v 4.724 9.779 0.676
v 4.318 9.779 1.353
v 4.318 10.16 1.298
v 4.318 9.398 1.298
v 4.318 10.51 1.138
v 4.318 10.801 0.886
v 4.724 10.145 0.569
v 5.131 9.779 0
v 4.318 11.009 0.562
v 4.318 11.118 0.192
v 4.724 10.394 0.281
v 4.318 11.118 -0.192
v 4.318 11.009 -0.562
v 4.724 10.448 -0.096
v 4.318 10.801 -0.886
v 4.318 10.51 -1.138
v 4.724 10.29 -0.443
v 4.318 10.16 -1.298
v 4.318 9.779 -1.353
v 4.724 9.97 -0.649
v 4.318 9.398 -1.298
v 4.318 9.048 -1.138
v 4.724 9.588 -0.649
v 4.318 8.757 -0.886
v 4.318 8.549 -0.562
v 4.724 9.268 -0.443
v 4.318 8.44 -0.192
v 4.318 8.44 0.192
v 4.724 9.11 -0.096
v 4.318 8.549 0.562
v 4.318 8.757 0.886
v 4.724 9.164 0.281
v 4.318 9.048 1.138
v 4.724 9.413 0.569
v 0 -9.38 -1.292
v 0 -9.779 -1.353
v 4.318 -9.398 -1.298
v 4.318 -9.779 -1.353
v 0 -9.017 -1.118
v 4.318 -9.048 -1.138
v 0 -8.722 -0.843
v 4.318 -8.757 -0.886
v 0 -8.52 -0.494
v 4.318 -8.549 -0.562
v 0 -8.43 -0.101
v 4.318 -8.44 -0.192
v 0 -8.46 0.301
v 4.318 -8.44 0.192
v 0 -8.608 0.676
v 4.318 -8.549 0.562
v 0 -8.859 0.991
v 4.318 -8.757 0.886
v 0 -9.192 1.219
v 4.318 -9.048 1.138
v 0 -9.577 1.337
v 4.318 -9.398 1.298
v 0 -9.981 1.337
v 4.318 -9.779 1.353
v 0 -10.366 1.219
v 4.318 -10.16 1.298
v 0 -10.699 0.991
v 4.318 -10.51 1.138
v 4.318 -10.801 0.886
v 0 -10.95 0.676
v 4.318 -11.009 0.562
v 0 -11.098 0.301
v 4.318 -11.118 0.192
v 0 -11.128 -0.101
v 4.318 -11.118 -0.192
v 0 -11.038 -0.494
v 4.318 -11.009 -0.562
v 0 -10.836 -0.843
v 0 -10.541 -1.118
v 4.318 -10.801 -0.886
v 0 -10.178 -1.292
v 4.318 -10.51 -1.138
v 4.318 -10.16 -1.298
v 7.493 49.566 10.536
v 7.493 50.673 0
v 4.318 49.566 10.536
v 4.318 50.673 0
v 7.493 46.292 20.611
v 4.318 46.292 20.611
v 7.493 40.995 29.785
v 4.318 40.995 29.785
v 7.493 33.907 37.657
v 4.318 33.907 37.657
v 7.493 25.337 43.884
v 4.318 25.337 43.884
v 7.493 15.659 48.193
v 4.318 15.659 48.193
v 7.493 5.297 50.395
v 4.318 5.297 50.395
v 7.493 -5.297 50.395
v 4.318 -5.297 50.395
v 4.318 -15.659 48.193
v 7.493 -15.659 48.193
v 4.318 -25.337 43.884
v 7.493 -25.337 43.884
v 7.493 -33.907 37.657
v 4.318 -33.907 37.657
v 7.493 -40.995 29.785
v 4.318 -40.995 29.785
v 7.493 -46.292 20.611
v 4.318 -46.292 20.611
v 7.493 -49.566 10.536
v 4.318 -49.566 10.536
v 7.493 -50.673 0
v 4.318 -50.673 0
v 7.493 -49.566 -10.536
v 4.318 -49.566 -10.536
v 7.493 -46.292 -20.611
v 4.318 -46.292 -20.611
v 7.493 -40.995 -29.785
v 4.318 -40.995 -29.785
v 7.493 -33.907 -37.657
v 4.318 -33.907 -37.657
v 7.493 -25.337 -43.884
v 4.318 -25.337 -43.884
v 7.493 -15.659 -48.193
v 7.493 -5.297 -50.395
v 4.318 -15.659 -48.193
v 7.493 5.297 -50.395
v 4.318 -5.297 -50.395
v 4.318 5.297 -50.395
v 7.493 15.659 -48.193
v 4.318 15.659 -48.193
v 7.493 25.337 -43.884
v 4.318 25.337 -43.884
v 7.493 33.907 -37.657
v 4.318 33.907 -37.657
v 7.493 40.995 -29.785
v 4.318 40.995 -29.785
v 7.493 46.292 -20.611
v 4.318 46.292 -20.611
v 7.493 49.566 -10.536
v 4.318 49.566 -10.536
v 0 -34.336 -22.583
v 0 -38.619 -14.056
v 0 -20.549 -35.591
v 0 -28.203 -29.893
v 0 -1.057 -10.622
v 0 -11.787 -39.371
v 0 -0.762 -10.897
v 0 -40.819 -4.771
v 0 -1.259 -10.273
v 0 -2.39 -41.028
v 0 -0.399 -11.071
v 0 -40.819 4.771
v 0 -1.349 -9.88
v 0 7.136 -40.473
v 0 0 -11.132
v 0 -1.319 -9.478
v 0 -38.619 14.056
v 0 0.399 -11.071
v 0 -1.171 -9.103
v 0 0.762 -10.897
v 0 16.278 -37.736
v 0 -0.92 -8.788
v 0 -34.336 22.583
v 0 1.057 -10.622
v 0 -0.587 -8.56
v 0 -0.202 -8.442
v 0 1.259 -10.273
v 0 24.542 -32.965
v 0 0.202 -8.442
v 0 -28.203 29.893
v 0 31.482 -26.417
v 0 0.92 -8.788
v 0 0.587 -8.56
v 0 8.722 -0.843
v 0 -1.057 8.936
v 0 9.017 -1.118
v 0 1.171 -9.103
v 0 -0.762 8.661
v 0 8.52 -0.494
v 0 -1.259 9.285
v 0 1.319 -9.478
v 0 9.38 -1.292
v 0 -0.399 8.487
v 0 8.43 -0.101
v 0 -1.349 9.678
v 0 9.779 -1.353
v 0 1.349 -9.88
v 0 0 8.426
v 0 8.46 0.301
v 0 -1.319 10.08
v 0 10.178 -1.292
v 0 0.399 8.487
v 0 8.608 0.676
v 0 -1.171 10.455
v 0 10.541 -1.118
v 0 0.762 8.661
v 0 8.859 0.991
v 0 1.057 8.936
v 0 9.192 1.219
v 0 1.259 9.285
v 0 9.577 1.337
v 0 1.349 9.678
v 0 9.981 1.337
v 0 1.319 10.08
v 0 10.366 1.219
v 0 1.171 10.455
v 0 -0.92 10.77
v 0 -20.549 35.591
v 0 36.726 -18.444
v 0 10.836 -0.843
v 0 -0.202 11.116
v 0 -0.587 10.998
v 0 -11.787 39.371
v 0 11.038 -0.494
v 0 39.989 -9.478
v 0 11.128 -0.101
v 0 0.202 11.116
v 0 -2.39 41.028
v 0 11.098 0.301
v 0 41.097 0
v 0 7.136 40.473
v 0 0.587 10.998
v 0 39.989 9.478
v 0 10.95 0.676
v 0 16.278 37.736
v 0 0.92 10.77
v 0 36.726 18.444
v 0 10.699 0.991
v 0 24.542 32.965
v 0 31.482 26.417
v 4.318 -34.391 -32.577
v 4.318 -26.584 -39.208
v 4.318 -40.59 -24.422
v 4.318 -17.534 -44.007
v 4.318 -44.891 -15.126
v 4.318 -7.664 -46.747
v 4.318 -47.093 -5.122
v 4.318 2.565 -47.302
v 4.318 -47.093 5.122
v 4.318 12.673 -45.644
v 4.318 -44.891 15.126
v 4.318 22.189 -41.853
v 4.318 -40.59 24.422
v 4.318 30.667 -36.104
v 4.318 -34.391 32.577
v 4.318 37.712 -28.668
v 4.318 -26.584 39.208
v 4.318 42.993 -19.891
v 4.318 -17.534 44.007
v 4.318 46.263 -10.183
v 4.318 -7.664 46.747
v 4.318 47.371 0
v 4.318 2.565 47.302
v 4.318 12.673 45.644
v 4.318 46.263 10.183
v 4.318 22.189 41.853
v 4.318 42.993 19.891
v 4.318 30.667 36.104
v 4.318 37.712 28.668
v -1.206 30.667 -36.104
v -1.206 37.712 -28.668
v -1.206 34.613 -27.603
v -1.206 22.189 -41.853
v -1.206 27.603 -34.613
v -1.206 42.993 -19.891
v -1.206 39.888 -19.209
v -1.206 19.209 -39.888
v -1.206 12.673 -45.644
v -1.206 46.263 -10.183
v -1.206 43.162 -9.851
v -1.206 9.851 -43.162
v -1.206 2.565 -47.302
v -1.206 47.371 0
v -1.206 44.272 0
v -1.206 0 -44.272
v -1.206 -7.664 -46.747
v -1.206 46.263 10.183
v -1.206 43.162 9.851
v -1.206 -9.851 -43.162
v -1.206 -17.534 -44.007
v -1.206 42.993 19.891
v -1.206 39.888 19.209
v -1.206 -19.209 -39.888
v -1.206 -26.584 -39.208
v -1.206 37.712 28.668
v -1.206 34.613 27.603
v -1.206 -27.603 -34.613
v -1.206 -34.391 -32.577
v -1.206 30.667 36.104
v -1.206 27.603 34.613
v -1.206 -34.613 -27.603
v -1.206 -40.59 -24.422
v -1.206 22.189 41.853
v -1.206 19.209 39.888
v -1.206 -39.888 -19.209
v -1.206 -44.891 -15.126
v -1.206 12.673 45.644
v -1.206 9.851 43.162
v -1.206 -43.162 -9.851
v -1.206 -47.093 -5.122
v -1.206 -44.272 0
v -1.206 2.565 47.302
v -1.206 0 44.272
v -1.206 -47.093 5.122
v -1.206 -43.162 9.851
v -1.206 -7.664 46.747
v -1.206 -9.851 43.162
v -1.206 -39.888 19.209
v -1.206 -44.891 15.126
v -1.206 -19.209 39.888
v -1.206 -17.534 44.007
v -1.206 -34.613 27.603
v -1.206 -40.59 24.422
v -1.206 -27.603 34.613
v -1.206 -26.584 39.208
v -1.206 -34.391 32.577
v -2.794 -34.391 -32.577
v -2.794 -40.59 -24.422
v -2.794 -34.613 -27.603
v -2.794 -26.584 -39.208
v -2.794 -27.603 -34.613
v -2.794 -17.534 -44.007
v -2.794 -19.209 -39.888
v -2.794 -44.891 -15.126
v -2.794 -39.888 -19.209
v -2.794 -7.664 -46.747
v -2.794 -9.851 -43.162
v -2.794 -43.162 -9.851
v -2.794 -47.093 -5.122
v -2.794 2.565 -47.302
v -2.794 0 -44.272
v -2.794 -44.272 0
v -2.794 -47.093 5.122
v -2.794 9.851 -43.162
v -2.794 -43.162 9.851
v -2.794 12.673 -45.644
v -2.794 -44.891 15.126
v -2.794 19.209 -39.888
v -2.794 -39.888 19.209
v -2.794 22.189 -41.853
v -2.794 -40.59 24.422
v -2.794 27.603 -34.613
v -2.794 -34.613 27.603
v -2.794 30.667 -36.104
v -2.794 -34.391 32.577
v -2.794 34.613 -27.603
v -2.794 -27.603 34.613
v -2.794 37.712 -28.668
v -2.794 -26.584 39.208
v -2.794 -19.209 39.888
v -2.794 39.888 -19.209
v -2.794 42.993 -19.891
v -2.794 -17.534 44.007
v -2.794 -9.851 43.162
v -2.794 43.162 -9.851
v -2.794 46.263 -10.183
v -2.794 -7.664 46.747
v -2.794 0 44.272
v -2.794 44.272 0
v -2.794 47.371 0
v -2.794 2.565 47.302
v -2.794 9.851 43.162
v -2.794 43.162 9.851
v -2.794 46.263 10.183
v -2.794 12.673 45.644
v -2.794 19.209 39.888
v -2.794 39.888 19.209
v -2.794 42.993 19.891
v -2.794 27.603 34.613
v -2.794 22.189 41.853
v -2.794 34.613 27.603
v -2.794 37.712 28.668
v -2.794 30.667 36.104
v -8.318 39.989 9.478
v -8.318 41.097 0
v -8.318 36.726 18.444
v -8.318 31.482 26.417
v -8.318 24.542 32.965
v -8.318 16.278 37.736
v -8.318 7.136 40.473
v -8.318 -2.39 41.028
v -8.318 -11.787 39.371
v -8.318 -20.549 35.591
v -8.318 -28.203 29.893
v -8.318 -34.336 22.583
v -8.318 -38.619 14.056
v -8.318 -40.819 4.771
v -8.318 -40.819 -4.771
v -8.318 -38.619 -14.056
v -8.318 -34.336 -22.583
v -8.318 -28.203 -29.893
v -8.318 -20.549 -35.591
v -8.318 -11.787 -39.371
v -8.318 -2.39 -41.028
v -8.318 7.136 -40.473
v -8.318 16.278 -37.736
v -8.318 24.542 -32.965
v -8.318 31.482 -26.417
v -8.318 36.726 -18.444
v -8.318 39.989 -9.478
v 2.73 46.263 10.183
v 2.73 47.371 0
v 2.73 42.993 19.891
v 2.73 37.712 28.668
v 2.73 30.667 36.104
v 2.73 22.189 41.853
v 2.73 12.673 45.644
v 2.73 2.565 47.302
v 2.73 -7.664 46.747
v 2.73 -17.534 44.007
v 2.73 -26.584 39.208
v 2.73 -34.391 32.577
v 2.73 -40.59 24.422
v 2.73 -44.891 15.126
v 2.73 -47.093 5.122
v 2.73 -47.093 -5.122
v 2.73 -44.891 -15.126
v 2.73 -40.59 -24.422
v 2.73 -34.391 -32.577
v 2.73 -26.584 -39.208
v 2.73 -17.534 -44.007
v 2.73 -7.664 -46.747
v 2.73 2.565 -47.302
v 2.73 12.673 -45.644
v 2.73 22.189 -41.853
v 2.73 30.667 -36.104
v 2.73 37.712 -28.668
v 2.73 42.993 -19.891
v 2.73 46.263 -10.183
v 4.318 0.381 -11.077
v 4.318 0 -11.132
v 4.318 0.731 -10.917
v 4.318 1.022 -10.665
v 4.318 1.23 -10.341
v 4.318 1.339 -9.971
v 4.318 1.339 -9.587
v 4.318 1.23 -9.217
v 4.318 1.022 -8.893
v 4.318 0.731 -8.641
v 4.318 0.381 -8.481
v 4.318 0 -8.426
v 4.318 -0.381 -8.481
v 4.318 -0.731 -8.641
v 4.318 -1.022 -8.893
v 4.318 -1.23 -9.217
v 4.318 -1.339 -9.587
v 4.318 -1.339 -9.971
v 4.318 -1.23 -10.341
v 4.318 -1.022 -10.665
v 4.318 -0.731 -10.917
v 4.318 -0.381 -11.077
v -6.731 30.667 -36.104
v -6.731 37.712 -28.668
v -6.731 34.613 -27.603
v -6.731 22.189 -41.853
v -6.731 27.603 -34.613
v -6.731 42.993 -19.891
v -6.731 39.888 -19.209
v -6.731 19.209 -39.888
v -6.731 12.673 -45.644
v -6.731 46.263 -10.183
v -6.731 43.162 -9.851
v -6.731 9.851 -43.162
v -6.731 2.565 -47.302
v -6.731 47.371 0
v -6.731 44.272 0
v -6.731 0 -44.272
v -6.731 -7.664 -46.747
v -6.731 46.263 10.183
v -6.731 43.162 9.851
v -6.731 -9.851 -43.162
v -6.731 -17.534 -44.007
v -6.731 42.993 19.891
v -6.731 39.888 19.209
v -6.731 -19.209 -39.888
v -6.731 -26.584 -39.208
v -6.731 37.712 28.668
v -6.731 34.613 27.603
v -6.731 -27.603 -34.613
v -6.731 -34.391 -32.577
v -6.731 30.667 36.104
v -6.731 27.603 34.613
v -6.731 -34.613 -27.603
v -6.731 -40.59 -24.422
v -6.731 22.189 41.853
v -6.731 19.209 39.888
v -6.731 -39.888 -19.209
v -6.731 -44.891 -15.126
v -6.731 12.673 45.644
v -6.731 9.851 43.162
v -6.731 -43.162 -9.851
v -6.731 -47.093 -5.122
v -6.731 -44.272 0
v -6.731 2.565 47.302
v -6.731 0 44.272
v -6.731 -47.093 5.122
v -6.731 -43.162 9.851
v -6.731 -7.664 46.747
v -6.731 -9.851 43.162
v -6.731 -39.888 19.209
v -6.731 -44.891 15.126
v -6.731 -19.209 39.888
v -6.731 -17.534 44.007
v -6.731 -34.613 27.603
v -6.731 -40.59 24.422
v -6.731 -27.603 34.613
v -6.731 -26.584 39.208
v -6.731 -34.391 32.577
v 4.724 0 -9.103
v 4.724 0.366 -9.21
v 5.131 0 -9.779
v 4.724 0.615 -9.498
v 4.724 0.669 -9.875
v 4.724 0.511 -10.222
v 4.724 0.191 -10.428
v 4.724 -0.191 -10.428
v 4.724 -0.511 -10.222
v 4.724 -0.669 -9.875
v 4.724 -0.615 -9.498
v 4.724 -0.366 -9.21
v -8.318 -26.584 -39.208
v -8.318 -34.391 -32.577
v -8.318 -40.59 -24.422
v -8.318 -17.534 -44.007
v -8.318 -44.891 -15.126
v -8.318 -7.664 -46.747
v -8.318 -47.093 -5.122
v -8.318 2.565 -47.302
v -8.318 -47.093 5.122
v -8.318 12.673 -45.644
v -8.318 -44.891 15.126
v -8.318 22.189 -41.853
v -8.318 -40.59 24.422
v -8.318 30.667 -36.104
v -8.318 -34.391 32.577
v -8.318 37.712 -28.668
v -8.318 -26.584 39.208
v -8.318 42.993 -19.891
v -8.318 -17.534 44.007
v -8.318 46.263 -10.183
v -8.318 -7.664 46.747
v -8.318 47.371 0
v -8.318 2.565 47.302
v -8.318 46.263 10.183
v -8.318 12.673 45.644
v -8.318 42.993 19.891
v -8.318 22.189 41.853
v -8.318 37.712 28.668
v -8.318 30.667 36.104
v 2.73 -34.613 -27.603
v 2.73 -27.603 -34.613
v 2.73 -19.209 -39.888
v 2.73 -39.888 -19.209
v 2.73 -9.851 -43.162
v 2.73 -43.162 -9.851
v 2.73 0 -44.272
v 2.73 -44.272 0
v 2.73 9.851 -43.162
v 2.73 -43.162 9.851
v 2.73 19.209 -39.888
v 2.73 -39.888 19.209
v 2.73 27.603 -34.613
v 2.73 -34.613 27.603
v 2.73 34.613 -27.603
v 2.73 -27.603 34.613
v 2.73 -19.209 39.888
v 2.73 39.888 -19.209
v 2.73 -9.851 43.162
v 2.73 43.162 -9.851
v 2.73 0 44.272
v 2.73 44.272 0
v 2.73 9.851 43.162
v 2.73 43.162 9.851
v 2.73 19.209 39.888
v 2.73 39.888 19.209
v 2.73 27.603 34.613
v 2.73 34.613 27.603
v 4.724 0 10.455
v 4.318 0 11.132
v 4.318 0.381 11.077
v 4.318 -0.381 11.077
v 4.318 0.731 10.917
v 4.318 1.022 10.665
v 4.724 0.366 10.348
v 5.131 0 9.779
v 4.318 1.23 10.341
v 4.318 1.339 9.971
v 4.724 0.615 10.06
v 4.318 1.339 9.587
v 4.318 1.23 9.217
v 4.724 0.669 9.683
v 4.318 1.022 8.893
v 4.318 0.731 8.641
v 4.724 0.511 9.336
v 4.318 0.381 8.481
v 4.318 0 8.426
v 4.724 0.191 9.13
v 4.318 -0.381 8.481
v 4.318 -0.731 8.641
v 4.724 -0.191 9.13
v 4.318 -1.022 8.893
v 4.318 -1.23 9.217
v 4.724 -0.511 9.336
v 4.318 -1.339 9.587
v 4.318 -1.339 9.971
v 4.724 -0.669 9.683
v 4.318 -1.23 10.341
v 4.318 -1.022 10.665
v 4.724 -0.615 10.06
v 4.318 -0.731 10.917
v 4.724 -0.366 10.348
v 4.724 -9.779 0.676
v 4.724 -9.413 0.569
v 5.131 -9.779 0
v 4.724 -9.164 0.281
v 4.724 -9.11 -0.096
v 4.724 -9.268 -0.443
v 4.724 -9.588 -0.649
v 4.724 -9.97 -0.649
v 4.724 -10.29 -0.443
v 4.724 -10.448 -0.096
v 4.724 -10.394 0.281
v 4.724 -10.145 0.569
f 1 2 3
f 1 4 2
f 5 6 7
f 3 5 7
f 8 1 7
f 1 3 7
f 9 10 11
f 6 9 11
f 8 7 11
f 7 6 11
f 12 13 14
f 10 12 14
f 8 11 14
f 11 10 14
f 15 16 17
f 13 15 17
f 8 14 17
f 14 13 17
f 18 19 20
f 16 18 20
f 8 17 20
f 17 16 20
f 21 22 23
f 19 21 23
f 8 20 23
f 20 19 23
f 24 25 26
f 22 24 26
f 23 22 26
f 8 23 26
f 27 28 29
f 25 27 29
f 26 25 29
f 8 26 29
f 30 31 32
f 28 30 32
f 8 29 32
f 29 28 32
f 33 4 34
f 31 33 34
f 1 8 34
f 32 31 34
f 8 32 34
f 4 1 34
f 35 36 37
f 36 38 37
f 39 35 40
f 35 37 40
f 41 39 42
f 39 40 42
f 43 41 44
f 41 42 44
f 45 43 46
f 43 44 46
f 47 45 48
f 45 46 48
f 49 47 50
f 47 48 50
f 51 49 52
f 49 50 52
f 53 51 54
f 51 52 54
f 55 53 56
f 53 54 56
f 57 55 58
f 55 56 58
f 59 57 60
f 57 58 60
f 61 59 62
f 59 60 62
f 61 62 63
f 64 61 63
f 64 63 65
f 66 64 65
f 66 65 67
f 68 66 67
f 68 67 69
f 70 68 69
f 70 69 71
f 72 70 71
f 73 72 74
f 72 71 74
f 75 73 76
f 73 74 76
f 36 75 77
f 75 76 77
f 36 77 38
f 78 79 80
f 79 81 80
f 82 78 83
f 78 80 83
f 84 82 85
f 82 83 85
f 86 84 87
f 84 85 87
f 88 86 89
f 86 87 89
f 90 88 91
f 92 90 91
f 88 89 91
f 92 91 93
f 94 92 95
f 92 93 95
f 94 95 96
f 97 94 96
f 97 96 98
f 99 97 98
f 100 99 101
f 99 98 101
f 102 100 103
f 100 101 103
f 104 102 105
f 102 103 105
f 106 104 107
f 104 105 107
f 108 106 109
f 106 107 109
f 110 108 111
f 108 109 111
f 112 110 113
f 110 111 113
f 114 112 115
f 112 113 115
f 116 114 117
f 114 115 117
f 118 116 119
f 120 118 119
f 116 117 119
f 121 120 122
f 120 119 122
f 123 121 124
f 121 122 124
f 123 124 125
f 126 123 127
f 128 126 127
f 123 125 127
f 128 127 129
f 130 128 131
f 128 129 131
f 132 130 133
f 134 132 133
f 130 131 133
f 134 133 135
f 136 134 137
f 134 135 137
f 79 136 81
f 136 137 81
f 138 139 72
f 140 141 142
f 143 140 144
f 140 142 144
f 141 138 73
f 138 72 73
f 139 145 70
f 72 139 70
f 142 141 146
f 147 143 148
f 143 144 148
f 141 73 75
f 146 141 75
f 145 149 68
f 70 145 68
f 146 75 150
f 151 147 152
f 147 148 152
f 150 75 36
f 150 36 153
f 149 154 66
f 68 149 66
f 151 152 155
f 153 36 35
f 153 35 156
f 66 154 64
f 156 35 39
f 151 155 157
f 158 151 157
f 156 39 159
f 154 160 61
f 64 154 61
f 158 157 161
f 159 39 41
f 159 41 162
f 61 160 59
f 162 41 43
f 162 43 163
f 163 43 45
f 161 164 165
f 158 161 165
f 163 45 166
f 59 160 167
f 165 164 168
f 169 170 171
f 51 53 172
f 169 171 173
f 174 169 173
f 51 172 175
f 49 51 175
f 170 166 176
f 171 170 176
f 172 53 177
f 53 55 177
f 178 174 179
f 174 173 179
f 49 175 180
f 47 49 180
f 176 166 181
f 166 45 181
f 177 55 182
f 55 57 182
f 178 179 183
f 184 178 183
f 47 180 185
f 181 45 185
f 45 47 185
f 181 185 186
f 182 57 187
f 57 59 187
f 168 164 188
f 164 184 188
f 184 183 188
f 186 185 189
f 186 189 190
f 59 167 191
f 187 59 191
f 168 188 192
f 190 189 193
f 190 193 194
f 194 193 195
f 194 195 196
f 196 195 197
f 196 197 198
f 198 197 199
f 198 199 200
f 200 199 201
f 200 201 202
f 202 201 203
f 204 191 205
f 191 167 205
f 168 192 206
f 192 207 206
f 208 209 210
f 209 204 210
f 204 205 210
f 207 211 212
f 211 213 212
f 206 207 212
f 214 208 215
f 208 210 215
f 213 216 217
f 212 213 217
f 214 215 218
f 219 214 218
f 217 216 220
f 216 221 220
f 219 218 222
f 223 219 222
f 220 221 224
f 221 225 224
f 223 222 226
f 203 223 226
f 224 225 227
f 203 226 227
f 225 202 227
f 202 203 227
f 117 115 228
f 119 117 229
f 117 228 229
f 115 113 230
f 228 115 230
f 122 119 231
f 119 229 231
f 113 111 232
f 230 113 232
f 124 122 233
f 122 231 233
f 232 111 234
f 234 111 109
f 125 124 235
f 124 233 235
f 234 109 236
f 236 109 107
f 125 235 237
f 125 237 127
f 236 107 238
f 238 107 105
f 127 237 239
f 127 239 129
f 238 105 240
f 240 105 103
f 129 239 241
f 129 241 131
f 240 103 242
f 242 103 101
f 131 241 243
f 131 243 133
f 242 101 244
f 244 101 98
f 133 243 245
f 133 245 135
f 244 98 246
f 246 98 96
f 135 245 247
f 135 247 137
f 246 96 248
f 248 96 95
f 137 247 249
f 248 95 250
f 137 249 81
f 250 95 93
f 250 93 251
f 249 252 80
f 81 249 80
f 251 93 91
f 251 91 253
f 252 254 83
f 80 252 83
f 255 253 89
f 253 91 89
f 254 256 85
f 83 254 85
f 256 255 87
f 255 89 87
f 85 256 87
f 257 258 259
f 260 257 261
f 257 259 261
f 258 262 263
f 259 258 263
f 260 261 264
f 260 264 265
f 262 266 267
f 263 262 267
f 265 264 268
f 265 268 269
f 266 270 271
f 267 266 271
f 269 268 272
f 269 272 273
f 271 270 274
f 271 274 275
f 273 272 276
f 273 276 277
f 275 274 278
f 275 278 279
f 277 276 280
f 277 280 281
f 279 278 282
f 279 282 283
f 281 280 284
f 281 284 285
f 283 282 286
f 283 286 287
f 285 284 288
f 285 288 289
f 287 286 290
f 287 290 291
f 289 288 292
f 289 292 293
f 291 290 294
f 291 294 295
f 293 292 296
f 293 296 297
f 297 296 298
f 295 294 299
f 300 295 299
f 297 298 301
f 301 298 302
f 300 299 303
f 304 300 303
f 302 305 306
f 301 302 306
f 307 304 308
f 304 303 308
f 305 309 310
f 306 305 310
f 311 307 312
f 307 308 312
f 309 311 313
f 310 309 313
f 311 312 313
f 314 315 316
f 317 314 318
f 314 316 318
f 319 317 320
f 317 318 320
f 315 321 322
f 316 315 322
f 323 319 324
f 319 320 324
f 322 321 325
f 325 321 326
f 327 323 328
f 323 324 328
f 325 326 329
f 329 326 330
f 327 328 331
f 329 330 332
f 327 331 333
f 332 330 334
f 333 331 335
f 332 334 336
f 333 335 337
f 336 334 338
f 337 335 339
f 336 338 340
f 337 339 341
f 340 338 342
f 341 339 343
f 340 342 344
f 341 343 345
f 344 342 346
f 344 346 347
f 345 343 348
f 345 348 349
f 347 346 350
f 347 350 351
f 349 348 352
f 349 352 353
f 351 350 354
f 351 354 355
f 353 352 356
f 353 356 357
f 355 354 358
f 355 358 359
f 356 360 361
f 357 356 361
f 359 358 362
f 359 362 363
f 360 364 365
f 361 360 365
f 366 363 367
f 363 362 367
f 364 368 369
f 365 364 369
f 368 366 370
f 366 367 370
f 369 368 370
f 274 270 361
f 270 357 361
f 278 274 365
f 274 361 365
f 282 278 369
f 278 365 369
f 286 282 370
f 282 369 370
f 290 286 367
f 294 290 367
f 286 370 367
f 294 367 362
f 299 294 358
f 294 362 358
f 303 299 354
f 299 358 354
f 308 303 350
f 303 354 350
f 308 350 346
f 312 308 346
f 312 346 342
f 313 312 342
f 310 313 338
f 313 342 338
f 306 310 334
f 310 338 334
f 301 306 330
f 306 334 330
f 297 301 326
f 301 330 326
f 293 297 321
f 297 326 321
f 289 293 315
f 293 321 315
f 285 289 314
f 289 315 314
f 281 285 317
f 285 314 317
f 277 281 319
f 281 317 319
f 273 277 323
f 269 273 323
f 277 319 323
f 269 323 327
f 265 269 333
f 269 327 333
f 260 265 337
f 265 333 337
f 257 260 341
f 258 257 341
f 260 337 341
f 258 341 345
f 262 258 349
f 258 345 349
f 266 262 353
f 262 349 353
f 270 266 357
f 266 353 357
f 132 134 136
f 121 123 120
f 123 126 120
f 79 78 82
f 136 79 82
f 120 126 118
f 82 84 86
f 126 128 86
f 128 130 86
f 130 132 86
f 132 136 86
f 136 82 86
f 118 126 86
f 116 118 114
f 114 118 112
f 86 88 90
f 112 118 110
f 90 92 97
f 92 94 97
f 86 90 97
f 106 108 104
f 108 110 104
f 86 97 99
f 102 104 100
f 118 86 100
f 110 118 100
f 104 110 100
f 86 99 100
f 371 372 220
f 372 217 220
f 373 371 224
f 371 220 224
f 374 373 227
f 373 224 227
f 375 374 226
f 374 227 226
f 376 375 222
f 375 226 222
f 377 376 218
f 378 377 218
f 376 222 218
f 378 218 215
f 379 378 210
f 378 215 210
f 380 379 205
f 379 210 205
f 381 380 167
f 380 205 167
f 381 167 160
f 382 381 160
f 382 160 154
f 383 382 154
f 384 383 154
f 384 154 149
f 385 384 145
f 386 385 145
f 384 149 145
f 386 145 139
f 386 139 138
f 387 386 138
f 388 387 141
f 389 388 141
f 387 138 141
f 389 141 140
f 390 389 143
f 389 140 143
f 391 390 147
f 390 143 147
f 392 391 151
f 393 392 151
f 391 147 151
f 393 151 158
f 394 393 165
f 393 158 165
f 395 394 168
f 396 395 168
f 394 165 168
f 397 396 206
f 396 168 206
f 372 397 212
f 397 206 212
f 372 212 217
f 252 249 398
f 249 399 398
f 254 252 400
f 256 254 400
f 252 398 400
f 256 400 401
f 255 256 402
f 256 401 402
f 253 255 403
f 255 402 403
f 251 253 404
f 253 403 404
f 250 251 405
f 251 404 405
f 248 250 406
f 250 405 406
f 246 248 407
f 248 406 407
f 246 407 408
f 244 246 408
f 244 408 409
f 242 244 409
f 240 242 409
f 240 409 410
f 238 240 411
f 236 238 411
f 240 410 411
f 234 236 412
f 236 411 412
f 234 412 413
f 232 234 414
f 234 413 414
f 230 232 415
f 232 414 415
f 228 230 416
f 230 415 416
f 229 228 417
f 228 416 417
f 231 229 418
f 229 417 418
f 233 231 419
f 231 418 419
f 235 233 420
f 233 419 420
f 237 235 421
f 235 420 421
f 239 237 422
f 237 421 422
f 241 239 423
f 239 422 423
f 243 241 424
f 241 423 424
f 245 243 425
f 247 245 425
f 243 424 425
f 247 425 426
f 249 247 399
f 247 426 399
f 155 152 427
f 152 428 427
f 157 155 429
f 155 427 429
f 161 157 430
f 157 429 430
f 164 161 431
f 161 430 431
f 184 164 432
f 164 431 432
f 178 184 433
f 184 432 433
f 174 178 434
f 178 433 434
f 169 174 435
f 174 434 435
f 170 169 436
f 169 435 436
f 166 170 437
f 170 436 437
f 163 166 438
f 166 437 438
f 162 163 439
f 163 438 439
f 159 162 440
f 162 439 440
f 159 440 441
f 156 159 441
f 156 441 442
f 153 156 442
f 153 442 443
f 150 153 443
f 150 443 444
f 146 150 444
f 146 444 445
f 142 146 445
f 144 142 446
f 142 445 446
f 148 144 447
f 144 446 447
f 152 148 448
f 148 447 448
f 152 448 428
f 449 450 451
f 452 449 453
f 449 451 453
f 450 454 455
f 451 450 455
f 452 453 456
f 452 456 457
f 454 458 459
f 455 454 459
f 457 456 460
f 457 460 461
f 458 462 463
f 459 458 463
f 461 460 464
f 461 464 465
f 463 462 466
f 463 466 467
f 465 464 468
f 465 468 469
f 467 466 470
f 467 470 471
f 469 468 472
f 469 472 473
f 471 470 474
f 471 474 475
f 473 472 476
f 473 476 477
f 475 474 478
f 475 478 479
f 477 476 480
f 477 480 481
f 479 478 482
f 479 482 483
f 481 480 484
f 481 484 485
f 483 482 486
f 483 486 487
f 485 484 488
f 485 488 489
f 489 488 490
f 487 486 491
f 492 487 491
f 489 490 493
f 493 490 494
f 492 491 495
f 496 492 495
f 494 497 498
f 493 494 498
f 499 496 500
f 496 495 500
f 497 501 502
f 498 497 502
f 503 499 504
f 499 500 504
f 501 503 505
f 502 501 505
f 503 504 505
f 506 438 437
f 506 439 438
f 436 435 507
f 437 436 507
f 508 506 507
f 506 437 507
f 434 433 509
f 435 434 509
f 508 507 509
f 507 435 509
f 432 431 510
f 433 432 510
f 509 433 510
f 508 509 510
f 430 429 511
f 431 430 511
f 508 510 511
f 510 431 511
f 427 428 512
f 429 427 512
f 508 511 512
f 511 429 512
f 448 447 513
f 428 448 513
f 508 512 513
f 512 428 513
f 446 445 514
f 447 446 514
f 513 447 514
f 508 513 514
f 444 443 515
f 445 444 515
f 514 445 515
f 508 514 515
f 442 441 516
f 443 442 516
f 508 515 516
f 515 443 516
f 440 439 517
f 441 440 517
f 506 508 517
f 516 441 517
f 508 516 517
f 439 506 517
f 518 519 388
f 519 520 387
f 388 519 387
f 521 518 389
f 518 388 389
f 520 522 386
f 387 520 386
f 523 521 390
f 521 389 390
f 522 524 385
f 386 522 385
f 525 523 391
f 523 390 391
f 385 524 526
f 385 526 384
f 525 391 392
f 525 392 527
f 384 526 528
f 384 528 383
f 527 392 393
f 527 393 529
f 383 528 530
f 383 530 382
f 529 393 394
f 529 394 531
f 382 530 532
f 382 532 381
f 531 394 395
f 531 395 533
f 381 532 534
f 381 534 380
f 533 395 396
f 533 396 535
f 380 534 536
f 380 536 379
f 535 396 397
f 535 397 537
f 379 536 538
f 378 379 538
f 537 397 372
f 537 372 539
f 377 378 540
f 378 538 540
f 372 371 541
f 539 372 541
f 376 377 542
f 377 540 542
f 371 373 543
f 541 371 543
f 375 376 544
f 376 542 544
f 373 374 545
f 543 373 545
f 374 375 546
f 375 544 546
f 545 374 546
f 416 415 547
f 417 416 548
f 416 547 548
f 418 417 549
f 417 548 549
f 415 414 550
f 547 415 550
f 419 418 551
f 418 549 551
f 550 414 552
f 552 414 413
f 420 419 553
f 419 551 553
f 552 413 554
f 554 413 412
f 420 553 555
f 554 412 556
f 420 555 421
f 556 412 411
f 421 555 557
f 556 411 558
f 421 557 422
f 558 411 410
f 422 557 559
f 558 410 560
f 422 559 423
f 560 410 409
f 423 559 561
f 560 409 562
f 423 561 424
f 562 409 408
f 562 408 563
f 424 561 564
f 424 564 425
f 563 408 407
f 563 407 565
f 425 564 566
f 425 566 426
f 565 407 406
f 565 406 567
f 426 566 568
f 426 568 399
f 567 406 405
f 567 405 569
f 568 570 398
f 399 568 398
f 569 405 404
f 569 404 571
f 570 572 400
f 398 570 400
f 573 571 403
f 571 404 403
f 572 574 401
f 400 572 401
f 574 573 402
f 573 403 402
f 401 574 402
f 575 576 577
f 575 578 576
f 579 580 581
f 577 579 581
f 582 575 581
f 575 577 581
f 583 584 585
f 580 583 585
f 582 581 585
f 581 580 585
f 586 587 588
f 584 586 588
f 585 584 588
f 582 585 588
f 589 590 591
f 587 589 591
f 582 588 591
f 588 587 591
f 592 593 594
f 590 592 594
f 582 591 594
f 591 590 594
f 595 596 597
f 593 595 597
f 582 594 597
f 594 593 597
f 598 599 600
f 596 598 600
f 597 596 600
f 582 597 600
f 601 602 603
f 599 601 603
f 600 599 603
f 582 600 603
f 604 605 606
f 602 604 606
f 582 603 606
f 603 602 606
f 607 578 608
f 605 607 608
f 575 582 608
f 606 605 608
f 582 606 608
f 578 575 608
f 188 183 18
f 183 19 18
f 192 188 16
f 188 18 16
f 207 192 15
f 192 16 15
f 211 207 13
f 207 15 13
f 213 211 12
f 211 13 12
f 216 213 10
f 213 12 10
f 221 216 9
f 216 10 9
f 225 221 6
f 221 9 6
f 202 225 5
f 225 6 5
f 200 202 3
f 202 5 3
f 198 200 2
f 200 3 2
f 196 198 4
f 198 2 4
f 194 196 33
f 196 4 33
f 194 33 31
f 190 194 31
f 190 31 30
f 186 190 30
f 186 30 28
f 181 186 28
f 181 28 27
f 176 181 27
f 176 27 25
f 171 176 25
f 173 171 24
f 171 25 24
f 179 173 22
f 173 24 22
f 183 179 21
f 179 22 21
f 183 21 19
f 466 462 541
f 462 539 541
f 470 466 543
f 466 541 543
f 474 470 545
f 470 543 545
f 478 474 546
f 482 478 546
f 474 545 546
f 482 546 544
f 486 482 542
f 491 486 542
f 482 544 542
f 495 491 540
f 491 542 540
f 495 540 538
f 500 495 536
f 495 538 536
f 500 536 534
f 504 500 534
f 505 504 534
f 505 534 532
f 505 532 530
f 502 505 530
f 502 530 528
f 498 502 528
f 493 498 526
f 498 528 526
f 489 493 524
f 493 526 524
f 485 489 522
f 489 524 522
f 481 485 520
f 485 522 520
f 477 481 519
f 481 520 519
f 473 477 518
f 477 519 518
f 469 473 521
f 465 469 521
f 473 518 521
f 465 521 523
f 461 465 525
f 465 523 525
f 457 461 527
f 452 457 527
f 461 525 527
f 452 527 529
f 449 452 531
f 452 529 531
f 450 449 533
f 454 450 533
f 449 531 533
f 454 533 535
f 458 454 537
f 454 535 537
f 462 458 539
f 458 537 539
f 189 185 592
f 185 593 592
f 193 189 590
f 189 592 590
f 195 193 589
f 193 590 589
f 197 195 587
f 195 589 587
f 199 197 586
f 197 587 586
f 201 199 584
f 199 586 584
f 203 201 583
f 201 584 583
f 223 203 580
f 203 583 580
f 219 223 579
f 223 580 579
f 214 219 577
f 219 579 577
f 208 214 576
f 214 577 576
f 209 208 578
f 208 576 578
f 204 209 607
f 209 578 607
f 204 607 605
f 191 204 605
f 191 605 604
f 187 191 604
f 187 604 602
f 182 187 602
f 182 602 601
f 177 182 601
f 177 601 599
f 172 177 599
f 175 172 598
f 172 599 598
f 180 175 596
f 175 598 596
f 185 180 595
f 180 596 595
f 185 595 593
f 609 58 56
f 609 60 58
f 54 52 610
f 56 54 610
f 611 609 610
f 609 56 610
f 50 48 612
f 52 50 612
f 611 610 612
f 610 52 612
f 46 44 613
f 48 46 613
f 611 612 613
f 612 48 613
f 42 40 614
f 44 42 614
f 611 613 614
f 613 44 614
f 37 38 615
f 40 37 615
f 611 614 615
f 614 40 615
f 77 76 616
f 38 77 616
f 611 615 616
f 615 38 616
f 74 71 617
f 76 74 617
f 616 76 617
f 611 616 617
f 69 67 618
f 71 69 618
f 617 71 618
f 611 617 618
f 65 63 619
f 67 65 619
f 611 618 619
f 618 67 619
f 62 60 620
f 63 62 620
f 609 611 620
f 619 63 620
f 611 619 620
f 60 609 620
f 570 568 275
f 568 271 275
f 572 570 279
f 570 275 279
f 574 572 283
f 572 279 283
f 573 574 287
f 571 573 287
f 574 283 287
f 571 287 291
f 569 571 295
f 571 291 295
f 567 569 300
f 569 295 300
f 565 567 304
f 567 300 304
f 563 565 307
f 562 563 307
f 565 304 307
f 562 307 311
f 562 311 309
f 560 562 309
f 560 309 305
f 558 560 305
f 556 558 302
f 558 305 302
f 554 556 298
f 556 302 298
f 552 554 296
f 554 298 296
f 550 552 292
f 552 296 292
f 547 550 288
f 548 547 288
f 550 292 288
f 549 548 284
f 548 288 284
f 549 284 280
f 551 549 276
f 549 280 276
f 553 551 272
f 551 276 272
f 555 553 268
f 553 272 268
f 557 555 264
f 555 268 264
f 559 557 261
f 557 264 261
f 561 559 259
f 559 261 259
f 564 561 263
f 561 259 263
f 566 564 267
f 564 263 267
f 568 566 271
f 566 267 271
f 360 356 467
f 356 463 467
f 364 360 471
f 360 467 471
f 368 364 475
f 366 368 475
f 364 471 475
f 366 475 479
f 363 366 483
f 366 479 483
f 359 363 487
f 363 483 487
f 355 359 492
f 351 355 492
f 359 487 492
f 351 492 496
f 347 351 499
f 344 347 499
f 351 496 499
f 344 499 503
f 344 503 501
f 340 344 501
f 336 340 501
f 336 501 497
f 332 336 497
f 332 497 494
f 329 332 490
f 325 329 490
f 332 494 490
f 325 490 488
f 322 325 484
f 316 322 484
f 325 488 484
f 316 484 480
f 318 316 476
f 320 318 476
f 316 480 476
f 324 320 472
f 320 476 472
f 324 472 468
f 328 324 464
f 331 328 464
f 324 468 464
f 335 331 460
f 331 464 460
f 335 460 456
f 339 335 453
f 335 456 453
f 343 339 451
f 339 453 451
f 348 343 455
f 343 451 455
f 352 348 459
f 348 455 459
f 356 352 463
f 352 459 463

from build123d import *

# Parameters (mm, degrees)
F_6_32_TAPPED_HOLE1_D     = 2.7051
F_6_32_TAPPED_HOLE1_DEPTH = 4.318
F_6_32_TAPPED_HOLE1_TIP   = 0.81269403


with BuildPart() as part:
    # Sketch1 → Revolve1 (revolve)
    with BuildSketch(Plane.XY):
        Polygon((4.318, 50.673), (4.318, 47.371), (2.7305, 47.371), (2.7305, 44.2722), (-1.2065, 44.2722), (-1.2065, 47.371), (-2.794, 47.371), (-2.794, 44.2722), (-6.731, 44.2722), (-6.731, 47.371), (-8.3185, 47.371), (-8.3185, 41.0972), (0, 41.0972), (0, 0), (7.493, 0), (7.493, 50.673), align=None)
    revolve(axis=Axis((0, 0, 0), (1, 0, 0)))

    # #6-32 Tapped Hole1
    with Locations(Plane.ZY):
        with Locations((0, 9.779), (0, -9.779), (-9.779, 0), (9.779, 0)):
            Hole(F_6_32_TAPPED_HOLE1_D / 2, depth=F_6_32_TAPPED_HOLE1_DEPTH)
            with Locations((0, 0, -(F_6_32_TAPPED_HOLE1_DEPTH + F_6_32_TAPPED_HOLE1_TIP / 2))):  # 118° drill point
                Cone(0, F_6_32_TAPPED_HOLE1_D / 2, F_6_32_TAPPED_HOLE1_TIP, mode=Mode.SUBTRACT)


solid = part.part
